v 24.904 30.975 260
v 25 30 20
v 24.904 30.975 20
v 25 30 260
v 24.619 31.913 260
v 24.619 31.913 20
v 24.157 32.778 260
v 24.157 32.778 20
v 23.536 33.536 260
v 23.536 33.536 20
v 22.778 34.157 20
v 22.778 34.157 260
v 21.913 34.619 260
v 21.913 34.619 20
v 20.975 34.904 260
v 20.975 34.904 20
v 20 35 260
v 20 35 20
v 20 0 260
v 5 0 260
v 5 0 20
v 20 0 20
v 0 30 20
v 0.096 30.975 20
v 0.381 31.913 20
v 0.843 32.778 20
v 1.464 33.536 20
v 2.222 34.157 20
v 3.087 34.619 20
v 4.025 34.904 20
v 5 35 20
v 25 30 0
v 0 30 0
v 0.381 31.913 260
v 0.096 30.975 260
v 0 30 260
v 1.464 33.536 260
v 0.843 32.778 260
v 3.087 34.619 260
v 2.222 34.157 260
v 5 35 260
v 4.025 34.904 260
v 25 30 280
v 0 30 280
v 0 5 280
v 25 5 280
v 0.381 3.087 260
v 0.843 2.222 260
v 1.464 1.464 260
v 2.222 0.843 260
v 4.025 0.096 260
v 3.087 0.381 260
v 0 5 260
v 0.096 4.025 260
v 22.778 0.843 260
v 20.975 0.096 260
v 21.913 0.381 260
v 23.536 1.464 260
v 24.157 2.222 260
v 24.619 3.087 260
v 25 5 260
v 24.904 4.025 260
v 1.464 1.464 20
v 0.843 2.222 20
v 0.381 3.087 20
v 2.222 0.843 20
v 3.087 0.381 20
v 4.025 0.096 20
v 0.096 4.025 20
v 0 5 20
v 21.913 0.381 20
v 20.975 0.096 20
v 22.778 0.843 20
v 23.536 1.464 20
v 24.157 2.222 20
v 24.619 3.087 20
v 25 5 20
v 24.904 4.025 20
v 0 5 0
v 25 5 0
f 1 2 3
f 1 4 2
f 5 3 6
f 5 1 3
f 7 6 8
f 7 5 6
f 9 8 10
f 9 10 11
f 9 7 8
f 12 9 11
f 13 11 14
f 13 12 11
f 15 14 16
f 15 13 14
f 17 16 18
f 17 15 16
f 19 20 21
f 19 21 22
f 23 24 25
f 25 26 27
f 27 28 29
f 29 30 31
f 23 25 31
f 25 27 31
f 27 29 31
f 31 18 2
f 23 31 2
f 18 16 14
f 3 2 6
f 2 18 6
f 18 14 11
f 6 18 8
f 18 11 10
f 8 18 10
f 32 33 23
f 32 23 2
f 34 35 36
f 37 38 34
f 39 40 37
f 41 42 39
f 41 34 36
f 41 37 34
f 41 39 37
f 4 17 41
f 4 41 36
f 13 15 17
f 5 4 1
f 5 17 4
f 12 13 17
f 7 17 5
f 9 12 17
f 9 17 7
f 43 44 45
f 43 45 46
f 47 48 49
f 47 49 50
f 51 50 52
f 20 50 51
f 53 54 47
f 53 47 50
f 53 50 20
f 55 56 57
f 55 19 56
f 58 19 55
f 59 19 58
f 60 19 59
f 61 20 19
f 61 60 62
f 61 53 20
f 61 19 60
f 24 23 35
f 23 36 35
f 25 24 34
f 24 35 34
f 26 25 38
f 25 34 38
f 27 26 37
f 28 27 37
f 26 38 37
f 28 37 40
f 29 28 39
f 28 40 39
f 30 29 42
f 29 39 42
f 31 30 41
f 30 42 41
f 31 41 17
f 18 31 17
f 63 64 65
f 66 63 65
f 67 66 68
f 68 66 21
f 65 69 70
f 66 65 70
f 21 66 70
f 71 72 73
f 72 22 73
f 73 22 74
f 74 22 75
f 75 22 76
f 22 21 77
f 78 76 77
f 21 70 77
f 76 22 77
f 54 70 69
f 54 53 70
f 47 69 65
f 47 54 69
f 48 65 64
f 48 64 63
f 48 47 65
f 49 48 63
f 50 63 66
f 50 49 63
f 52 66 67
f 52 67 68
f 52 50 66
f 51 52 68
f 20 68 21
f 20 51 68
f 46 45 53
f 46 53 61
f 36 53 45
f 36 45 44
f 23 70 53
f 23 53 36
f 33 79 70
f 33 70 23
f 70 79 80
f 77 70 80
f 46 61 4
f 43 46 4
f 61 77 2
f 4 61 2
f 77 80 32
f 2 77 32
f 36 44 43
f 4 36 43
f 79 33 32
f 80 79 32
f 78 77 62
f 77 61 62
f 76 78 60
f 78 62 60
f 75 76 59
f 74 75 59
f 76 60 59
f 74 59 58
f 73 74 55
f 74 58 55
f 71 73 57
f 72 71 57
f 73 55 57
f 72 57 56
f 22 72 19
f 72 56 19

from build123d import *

# Parameters (mm, degrees)
ESQUISSE1_W             = 25
ESQUISSE1_H             = 35
BOSS_EXTRU_1_DEPTH      = 280
ESQUISSE2_OUTSIDE_W     = 83.656
ESQUISSE2_OUTSIDE_H     = 93.656
ESQUISSE2_OUTSIDE_W_2   = 25
ESQUISSE2_OUTSIDE_H_2   = 25
ENL_V_MAT_EXTRU_2_DEPTH = 20
ENL_V_START             = -280
ESQUISSE2_2_OUTSIDE_W   = 83.656
ESQUISSE2_2_OUTSIDE_H   = 93.656
ESQUISSE2_2_OUTSIDE_W_2 = 25
ESQUISSE2_2_OUTSIDE_H_2 = 25
ENL_V_MAT_EXTRU_3_DEPTH = 20
CONG_1_R                = 5


with BuildPart() as part:
    # Esquisse1 → Boss.-Extru.1 (new body)
    with BuildSketch(Plane.XY):
        with Locations((12.5, 17.5)):
            Rectangle(ESQUISSE1_W, ESQUISSE1_H)
    extrude(amount=BOSS_EXTRU_1_DEPTH)

    # Esquisse2 outside → Enlèv. mat.-Extru.2 (cut)
    with BuildSketch(Plane.XY.offset(280)):
        with Locations((12.5, 17.5)):
            Rectangle(ESQUISSE2_OUTSIDE_W, ESQUISSE2_OUTSIDE_H)
        with Locations((12.5, 17.5)):
            Rectangle(ESQUISSE2_OUTSIDE_W_2, ESQUISSE2_OUTSIDE_H_2, mode=Mode.SUBTRACT)
    extrude(amount=-ENL_V_MAT_EXTRU_2_DEPTH, mode=Mode.SUBTRACT)

    # Esquisse2<2> outside → Enlèv. mat.-Extru.3 (cut)
    with BuildSketch(Plane.XY.offset(280).offset(ENL_V_START)):
        with Locations((12.5, 17.5)):
            Rectangle(ESQUISSE2_2_OUTSIDE_W, ESQUISSE2_2_OUTSIDE_H)
        with Locations((12.5, 17.5)):
            Rectangle(ESQUISSE2_2_OUTSIDE_W_2, ESQUISSE2_2_OUTSIDE_H_2, mode=Mode.SUBTRACT)
    extrude(amount=ENL_V_MAT_EXTRU_3_DEPTH, mode=Mode.SUBTRACT)

    # Congé1
    cong_1_edges = [part.edges().sort_by_distance(p)[0] for p in [
        (0, 0, 140),
        (25, 0, 140),
        (25, 35, 140),
        (0, 35, 140),
    ]]
    fillet(cong_1_edges, radius=CONG_1_R)


solid = part.part
